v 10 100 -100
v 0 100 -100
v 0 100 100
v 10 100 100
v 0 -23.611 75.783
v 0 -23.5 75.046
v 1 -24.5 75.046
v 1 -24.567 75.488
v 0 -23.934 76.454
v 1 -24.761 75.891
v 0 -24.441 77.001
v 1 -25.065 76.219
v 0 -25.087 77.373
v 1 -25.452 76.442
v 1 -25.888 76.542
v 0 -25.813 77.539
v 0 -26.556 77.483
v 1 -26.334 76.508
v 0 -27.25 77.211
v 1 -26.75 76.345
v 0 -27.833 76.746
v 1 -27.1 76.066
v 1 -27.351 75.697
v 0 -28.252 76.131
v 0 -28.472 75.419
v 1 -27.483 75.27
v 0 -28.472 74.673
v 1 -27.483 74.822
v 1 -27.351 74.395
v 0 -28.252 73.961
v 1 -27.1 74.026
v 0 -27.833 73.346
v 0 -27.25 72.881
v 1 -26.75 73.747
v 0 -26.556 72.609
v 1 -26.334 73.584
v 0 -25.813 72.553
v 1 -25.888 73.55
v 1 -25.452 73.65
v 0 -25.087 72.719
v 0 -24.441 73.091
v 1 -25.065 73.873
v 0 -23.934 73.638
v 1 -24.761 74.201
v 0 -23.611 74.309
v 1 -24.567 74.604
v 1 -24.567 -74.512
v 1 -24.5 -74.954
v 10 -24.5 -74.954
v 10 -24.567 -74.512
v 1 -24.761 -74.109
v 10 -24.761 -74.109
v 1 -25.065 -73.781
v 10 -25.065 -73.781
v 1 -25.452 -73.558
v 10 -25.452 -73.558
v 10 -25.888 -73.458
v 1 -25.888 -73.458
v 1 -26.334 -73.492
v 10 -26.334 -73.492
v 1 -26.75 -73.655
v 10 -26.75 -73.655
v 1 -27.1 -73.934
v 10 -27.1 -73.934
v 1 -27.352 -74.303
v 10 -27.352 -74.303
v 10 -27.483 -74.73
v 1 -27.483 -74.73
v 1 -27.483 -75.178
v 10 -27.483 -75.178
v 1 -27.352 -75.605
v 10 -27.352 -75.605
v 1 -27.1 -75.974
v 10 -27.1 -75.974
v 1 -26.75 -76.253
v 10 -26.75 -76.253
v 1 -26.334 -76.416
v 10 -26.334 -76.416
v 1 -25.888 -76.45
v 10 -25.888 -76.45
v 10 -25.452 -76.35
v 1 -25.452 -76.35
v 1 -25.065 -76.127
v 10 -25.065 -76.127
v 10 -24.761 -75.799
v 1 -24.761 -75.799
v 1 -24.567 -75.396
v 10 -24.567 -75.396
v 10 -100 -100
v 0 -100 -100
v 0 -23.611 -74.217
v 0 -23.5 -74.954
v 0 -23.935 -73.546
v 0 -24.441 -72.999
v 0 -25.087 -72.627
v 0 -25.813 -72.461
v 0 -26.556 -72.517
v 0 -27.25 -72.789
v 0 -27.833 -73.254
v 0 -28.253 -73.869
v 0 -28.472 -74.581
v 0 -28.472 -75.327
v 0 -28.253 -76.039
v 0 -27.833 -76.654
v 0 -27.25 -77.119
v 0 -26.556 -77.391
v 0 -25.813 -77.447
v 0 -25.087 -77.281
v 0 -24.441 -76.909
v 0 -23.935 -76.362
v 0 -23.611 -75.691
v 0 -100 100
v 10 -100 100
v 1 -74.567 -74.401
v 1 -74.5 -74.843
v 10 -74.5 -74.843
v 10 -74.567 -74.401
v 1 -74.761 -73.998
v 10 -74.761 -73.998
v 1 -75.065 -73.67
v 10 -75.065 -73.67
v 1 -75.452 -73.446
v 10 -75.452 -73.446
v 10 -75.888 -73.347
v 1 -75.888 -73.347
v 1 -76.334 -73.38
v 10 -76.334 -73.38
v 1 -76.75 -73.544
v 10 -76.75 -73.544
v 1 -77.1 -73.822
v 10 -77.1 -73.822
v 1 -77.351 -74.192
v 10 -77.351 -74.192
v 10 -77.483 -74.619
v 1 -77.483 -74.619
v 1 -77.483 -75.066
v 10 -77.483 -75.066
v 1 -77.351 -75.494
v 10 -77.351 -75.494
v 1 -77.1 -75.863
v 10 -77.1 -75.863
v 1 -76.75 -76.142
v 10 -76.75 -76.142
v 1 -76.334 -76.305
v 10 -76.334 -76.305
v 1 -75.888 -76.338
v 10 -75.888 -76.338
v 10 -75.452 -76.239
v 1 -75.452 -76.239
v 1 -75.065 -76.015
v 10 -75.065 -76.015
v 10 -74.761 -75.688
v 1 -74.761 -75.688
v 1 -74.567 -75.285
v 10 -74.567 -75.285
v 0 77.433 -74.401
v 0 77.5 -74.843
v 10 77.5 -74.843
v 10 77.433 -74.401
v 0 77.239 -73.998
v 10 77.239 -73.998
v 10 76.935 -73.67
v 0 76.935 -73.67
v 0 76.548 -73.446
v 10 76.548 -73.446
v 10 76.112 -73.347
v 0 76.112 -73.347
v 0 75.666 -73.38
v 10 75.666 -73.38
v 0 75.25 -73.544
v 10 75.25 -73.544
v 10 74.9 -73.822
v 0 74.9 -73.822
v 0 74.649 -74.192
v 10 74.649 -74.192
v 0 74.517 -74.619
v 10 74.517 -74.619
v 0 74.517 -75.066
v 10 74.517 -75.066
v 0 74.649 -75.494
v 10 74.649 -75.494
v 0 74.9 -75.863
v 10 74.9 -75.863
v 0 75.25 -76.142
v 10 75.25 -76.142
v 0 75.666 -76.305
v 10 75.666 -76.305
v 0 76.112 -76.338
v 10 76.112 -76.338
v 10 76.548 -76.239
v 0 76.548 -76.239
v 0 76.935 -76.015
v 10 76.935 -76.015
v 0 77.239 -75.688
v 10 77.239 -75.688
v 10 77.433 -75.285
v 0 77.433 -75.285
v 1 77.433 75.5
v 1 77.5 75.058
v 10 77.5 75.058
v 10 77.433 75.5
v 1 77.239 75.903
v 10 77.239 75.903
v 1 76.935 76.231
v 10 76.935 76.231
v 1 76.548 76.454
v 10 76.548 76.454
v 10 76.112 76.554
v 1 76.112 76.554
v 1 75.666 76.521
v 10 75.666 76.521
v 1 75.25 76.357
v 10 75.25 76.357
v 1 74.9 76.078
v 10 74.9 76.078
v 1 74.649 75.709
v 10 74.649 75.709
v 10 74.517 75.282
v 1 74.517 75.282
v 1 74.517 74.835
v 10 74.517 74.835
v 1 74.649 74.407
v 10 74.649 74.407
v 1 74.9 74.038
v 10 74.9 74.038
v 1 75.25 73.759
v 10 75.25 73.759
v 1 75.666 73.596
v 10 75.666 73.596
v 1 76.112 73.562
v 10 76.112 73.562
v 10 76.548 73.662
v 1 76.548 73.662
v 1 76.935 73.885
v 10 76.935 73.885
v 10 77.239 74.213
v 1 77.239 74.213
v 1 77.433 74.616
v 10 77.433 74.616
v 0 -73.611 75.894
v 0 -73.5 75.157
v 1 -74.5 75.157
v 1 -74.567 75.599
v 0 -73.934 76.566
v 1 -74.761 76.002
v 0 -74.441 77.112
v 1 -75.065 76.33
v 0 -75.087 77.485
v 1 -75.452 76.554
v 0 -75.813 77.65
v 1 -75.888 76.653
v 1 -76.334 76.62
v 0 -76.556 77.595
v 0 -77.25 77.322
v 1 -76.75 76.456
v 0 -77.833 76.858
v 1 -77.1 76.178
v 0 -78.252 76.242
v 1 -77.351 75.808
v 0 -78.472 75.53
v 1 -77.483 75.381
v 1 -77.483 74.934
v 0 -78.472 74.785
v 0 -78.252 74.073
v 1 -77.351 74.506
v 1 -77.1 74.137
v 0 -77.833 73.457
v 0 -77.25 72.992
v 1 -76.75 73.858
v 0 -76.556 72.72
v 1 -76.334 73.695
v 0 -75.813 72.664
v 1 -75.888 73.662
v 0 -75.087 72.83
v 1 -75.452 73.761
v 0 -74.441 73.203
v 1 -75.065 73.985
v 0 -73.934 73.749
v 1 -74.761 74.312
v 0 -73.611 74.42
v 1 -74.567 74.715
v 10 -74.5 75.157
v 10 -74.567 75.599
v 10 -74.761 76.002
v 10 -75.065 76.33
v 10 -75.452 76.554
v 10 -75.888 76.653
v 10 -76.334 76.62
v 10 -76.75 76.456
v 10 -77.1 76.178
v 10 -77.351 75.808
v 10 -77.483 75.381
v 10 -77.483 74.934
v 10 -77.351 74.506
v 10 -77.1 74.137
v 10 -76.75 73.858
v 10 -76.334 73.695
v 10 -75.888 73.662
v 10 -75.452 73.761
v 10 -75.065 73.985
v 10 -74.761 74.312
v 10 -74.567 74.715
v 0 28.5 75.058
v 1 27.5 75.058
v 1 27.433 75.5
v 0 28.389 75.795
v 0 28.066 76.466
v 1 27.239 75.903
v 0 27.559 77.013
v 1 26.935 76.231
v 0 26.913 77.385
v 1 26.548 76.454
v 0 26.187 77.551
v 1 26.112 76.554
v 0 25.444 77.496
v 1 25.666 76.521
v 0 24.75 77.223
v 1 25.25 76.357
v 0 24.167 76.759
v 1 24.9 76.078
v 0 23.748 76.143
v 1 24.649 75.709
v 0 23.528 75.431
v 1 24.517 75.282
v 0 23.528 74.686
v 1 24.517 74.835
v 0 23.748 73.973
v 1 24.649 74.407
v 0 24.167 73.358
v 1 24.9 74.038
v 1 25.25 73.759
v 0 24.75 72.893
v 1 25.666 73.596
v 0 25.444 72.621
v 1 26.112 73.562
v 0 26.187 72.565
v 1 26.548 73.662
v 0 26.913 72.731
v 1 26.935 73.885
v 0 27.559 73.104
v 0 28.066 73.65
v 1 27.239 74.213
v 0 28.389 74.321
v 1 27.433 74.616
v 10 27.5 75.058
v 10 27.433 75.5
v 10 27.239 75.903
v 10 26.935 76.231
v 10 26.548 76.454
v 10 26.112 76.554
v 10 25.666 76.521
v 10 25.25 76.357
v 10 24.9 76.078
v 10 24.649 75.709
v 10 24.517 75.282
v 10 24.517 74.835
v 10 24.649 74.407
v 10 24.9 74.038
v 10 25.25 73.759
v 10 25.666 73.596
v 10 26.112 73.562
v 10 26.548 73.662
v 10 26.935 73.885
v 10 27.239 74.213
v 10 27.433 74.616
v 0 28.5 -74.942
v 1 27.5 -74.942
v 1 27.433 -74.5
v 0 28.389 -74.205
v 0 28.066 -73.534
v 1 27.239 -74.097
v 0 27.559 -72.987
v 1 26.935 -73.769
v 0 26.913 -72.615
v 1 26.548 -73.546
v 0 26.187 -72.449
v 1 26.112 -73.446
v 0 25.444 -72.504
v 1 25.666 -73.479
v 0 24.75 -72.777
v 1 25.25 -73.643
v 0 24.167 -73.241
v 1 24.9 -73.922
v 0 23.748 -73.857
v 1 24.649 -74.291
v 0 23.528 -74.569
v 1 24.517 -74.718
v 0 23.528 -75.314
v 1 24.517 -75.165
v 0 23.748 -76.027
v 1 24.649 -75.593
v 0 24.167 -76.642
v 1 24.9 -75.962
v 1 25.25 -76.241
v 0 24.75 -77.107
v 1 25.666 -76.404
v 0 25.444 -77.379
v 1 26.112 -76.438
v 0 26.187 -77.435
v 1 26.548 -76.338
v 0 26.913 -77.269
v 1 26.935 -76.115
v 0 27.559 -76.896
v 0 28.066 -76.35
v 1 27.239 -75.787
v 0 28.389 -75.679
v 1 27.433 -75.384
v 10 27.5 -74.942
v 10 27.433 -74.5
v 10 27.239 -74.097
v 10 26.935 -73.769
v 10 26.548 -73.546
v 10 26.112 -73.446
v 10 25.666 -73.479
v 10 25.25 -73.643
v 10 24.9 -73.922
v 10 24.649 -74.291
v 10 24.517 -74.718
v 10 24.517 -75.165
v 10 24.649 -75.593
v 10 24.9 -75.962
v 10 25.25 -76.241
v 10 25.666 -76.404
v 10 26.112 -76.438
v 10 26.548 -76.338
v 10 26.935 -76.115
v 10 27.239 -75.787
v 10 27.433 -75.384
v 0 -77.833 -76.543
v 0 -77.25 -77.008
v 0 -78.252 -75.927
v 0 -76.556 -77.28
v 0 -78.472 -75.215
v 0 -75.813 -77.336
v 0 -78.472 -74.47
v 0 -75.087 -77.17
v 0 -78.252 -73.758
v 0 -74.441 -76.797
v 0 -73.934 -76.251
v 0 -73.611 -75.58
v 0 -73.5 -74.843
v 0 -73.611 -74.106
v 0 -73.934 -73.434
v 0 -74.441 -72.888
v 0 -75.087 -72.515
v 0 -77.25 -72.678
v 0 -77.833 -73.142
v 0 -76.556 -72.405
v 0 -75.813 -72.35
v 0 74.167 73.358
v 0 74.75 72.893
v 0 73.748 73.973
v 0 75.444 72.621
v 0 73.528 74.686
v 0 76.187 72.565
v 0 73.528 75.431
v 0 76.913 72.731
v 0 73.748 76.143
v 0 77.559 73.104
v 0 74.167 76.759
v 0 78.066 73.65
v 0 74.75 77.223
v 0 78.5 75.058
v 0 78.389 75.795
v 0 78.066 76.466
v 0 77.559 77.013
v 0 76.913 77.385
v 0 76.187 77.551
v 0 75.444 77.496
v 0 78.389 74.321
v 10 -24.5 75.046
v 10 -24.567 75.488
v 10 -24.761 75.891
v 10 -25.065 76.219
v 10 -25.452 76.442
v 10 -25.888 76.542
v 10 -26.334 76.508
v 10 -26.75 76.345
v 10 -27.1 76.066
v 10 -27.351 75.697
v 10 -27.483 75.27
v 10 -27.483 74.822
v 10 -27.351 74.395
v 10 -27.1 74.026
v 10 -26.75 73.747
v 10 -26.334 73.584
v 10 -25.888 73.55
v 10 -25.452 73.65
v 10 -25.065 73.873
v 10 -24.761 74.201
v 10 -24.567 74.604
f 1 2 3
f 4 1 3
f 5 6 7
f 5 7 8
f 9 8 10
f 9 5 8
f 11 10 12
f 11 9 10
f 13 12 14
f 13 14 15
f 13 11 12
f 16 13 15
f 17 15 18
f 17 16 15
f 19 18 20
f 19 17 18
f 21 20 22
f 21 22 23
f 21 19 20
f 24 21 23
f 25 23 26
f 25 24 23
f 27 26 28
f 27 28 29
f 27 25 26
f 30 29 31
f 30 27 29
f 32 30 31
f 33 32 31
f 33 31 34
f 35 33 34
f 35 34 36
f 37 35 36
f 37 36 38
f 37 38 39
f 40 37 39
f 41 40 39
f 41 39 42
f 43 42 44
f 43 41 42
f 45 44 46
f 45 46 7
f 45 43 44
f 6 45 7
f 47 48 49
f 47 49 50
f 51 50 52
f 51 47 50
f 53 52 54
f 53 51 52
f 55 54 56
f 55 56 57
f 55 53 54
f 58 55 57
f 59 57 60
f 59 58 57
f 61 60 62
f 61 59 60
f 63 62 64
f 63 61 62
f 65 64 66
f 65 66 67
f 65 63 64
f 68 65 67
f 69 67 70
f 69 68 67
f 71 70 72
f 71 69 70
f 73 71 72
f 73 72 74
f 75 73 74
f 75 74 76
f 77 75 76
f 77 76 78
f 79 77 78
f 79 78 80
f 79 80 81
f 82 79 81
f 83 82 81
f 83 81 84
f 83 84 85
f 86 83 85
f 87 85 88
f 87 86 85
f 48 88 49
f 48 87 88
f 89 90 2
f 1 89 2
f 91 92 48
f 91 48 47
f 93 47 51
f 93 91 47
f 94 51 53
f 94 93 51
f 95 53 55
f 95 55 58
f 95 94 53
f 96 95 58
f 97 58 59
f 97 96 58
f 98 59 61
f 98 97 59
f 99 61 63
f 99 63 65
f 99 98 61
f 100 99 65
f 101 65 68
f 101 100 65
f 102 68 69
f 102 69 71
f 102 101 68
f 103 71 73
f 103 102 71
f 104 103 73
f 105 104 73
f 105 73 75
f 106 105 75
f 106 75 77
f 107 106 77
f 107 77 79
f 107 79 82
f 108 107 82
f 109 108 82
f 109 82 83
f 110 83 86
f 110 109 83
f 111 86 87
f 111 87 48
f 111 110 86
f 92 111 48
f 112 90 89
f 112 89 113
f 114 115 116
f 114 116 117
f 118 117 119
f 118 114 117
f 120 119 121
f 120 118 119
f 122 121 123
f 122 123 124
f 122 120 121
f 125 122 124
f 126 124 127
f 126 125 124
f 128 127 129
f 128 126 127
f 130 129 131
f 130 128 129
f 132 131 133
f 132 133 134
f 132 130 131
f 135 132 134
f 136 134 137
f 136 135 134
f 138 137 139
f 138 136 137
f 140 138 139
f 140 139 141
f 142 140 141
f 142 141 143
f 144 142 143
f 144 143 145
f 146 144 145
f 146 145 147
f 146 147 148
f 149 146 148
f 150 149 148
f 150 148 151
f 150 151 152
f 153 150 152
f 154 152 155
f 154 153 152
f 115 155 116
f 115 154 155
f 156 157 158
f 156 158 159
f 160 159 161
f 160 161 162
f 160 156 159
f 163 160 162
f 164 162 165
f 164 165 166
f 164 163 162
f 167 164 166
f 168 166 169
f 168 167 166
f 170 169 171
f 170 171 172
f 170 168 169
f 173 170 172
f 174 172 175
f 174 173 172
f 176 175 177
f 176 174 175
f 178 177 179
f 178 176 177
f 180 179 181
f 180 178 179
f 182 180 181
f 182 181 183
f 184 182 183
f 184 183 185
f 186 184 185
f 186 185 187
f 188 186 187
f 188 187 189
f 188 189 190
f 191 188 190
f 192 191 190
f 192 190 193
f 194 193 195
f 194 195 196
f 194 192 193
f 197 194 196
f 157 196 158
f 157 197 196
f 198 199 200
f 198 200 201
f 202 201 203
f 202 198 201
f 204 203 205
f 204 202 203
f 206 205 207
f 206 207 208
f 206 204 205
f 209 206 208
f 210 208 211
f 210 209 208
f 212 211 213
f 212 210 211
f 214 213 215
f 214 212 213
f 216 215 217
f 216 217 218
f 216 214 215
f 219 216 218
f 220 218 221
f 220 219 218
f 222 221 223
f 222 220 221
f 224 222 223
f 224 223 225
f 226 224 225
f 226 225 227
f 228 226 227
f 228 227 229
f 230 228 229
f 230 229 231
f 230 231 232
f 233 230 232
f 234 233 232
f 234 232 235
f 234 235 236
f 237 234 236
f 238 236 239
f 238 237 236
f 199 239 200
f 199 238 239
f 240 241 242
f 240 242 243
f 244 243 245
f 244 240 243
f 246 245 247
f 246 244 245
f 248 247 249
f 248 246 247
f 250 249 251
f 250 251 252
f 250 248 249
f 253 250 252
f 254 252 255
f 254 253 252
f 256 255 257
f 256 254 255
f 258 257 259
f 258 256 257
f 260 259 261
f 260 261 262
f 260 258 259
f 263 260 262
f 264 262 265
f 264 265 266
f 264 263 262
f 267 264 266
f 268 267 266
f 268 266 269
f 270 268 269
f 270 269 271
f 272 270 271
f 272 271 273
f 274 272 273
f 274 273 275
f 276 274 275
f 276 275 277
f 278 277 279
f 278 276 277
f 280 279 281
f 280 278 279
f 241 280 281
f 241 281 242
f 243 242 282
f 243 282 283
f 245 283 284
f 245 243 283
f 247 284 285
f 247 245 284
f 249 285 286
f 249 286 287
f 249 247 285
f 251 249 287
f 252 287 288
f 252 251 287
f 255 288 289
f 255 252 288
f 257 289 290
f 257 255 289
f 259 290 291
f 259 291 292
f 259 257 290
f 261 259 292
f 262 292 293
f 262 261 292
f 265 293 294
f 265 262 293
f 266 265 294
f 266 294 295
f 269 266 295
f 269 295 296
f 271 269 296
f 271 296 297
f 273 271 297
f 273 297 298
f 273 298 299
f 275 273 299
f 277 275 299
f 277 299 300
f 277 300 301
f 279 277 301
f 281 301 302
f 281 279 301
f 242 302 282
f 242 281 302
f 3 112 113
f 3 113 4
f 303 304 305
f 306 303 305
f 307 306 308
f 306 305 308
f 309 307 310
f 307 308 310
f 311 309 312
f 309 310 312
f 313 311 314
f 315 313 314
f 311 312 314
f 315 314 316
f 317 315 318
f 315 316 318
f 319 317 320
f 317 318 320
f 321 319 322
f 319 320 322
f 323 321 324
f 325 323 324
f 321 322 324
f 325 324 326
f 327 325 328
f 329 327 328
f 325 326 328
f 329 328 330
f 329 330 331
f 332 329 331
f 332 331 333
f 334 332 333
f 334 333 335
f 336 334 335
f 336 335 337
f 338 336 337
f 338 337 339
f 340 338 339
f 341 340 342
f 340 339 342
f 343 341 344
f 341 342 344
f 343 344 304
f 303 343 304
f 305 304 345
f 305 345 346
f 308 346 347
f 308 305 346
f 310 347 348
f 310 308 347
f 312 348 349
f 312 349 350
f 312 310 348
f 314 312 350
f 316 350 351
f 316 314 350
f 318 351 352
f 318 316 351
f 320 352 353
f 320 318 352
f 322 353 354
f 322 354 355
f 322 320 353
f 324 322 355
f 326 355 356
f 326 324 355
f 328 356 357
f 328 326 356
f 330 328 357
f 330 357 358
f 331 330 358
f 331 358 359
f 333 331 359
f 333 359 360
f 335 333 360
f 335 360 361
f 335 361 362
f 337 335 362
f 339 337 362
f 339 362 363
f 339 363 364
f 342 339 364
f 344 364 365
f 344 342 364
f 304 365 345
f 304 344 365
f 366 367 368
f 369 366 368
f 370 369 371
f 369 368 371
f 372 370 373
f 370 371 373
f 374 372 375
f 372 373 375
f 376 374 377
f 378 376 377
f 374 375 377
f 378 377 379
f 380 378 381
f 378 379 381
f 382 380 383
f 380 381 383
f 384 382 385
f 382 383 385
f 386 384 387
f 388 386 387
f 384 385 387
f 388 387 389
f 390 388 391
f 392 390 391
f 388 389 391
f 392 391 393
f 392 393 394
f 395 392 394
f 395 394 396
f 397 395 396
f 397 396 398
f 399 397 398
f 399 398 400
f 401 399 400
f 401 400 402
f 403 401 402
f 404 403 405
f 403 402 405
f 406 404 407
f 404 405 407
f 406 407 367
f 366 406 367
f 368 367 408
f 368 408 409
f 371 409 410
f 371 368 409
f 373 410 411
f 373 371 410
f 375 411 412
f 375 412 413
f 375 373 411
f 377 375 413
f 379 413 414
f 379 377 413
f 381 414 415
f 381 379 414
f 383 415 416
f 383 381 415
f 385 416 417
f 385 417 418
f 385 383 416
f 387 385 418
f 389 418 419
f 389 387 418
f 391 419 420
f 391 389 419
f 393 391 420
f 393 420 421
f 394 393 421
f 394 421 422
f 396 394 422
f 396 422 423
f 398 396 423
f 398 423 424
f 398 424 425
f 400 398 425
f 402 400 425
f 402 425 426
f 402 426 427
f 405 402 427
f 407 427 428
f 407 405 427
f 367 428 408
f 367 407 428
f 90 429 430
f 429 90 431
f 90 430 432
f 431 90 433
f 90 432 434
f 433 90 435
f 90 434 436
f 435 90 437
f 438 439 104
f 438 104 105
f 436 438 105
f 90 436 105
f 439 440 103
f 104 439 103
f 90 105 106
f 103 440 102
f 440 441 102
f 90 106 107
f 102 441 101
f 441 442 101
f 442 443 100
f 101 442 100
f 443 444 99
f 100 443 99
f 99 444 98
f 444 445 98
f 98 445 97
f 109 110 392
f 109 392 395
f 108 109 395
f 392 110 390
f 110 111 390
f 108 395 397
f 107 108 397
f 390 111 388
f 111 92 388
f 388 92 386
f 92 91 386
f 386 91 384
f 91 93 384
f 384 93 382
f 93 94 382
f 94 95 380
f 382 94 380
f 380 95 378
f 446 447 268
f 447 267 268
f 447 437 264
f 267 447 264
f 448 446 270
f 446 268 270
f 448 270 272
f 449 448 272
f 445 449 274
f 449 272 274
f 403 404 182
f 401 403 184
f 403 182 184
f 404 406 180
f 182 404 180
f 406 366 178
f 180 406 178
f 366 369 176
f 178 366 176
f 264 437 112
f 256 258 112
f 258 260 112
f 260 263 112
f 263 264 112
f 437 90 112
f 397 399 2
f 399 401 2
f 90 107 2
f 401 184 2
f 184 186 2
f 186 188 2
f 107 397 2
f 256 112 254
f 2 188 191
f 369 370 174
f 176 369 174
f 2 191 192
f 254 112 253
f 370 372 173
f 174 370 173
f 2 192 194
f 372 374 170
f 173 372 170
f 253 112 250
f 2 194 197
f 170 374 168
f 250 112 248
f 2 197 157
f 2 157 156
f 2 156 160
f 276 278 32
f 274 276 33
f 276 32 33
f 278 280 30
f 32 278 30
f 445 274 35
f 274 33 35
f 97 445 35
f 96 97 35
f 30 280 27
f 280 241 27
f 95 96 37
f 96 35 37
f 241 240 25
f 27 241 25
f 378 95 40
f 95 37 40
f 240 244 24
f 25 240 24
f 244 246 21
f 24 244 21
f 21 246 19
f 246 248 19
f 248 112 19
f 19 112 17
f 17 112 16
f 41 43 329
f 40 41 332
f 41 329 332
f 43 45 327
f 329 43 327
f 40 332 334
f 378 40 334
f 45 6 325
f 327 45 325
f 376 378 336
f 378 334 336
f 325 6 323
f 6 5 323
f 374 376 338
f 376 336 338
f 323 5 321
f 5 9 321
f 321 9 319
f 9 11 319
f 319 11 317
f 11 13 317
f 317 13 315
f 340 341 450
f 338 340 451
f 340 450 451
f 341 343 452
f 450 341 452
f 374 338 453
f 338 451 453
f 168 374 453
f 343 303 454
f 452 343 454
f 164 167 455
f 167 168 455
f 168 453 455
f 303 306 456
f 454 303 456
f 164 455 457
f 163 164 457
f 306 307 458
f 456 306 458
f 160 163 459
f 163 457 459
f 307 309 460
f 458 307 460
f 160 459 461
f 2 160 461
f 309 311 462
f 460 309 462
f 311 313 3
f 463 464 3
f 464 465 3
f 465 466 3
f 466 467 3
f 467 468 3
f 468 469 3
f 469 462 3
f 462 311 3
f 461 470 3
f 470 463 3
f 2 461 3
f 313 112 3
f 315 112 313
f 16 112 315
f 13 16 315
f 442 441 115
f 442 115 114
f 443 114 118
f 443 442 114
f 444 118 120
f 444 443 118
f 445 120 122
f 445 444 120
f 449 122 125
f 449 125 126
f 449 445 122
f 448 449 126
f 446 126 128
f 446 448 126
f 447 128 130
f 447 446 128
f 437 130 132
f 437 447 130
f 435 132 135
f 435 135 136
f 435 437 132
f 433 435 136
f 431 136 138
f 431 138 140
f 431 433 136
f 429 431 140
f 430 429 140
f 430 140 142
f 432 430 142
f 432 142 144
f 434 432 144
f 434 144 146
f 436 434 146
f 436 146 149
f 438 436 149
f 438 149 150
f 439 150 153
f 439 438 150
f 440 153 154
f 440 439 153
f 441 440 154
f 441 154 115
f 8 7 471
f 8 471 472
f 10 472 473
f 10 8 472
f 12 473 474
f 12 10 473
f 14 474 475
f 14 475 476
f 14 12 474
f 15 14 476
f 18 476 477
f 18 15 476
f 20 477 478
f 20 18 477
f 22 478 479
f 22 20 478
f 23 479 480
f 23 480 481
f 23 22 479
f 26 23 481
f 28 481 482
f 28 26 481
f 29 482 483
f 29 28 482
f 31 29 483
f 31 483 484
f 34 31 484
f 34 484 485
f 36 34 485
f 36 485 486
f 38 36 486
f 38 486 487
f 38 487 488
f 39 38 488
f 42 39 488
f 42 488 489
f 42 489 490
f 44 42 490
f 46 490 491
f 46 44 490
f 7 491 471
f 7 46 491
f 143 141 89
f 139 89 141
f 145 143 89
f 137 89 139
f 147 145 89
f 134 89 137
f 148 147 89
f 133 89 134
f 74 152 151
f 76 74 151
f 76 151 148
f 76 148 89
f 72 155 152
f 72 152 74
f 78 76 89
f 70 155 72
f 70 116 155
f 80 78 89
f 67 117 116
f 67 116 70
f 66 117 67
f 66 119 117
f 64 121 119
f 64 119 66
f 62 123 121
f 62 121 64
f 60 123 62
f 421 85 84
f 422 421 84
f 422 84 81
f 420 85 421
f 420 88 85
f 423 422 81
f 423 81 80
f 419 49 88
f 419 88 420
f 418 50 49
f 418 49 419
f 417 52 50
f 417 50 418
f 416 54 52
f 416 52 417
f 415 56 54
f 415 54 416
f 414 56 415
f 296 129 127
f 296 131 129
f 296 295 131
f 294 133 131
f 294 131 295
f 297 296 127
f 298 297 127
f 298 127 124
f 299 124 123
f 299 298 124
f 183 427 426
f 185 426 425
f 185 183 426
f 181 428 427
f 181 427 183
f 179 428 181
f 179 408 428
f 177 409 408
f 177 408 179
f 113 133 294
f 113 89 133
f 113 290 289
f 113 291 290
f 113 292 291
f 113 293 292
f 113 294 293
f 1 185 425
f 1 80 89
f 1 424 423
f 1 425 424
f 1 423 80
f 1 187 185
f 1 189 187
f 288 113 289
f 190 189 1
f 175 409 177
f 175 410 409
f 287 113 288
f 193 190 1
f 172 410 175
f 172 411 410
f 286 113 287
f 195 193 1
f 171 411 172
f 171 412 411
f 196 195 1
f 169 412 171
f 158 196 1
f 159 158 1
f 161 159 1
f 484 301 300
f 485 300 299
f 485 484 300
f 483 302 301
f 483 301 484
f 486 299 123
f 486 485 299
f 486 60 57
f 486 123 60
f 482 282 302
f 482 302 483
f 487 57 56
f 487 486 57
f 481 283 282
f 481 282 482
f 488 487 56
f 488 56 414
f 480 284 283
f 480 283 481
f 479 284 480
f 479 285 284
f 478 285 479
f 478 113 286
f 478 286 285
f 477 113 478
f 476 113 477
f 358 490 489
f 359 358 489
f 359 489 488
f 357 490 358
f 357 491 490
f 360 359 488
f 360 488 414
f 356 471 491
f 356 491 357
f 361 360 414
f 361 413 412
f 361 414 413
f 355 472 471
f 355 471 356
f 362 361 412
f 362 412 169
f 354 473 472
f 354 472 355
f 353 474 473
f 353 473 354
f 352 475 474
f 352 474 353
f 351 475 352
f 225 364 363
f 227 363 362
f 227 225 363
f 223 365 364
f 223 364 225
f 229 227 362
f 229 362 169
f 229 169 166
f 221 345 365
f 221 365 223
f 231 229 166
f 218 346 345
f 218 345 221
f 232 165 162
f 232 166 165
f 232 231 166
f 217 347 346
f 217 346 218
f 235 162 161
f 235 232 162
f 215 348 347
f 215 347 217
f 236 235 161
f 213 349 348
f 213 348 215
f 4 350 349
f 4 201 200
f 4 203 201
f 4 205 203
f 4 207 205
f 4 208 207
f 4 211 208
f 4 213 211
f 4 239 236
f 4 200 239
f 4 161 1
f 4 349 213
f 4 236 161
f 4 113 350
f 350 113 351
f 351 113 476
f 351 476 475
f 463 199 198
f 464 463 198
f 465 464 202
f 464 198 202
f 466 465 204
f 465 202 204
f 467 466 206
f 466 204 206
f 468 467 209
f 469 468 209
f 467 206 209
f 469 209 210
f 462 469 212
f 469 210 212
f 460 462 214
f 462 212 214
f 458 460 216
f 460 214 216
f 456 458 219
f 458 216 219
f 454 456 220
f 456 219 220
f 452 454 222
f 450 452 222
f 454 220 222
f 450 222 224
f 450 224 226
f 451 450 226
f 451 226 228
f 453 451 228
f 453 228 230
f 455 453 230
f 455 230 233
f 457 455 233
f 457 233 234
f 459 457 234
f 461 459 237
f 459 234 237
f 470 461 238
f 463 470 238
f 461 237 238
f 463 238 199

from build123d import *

# Parameters (mm, degrees)
F0_W     = 200
F0_H     = 200
F0_R     = 1.5
F1_DEPTH = 10
F2_SIZE  = 1
F3_SIZE  = 1


with BuildPart() as f1:
    # F0 (on Right) → F1 (new body)
    with BuildSketch(Plane.YZ):
        Rectangle(F0_W, F0_H)
        with Locations((-76, -74.842677)):
            Circle(F0_R, mode=Mode.SUBTRACT)
        with Locations((-26.000124, -74.953997)):
            Circle(F0_R, mode=Mode.SUBTRACT)
        with Locations((26, -74.941815)):
            Circle(F0_R, mode=Mode.SUBTRACT)
        with Locations((76, -74.842677)):
            Circle(F0_R, mode=Mode.SUBTRACT)
        with Locations((-76, 75.157323)):
            Circle(F0_R, mode=Mode.SUBTRACT)
        with Locations((-26, 75.046003)):
            Circle(F0_R, mode=Mode.SUBTRACT)
        with Locations((26, 75.058185)):
            Circle(F0_R, mode=Mode.SUBTRACT)
        with Locations((76, 75.058185)):
            Circle(F0_R, mode=Mode.SUBTRACT)
    extrude(amount=F1_DEPTH)

    # F2
    f2_edges = [f1.edges().sort_by_distance(p)[0] for p in [
        (0, -77.5, -74.842677),
        (0, -27.500124, -74.953997),
        (0, -27.5, 75.046003),
        (0, -77.5, 75.157323),
    ]]
    chamfer(f2_edges, length=F2_SIZE)

    # F3
    f3_edges = [f1.edges().sort_by_distance(p)[0] for p in [
        (0, 24.5, -74.941815),
        (0, 24.5, 75.058185),
        (0, 74.5, 75.058185),
    ]]
    chamfer(f3_edges, length=F3_SIZE)


solid = f1.part
